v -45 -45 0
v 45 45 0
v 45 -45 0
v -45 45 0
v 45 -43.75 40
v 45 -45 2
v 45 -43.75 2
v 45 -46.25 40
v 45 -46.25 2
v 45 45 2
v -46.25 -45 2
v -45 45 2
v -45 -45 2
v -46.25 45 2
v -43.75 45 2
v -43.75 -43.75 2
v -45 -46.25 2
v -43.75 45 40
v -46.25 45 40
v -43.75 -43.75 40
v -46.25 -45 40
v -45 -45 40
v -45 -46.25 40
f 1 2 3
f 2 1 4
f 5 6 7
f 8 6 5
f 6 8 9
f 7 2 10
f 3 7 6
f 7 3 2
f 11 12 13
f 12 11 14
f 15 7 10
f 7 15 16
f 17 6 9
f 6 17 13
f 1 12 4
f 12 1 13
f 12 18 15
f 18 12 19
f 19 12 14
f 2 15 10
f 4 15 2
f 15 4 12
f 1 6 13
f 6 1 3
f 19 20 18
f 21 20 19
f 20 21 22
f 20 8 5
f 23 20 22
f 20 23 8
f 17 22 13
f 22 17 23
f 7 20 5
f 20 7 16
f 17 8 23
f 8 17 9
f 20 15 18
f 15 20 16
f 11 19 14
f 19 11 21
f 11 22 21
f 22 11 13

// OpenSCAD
// Built by bench/smallmodels/features/compiler.py from a list of features.
$fn = 64;
difference() {
  union() {
    translate([0, 0, 0]) translate([-45, -45, 0]) cube([90, 90, 2]);
  }
  union() {
    translate([-20.25, -20.25, -2]) rotate([0, 0, 0]) translate([-35.75, -35.75, 0]) cube([71.5, 71.5, 2]);
    translate([-6.75, -20.25, -2]) rotate([0, 0, 0]) translate([-35.75, -35.75, 0]) cube([71.5, 71.5, 2]);
    translate([6.75, -20.25, -2]) rotate([0, 0, 0]) translate([-35.75, -35.75, 0]) cube([71.5, 71.5, 2]);
    translate([20.25, -20.25, -2]) rotate([0, 0, 0]) translate([-35.75, -35.75, 0]) cube([71.5, 71.5, 2]);
    translate([-20.25, -6.75, -2]) rotate([0, 0, 0]) translate([-35.75, -35.75, 0]) cube([71.5, 71.5, 2]);
    translate([-6.75, -6.75, -2]) rotate([0, 0, 0]) translate([-35.75, -35.75, 0]) cube([71.5, 71.5, 2]);
    translate([6.75, -6.75, -2]) rotate([0, 0, 0]) translate([-35.75, -35.75, 0]) cube([71.5, 71.5, 2]);
    translate([20.25, -6.75, -2]) rotate([0, 0, 0]) translate([-35.75, -35.75, 0]) cube([71.5, 71.5, 2]);
    translate([-20.25, 6.75, -2]) rotate([0, 0, 0]) translate([-35.75, -35.75, 0]) cube([71.5, 71.5, 2]);
    translate([-6.75, 6.75, -2]) rotate([0, 0, 0]) translate([-35.75, -35.75, 0]) cube([71.5, 71.5, 2]);
    translate([6.75, 6.75, -2]) rotate([0, 0, 0]) translate([-35.75, -35.75, 0]) cube([71.5, 71.5, 2]);
    translate([20.25, 6.75, -2]) rotate([0, 0, 0]) translate([-35.75, -35.75, 0]) cube([71.5, 71.5, 2]);
    translate([-20.25, 20.25, -2]) rotate([0, 0, 0]) translate([-35.75, -35.75, 0]) cube([71.5, 71.5, 2]);
    translate([-6.75, 20.25, -2]) rotate([0, 0, 0]) translate([-35.75, -35.75, 0]) cube([71.5, 71.5, 2]);
    translate([6.75, 20.25, -2]) rotate([0, 0, 0]) translate([-35.75, -35.75, 0]) cube([71.5, 71.5, 2]);
    translate([20.25, 20.25, -2]) rotate([0, 0, 0]) translate([-35.75, -35.75, 0]) cube([71.5, 71.5, 2]);
  }
}
union() {
    translate([0, -45, 2]) translate([-45, -1.25, 0]) cube([90, 2.5, 38]);
    translate([-45, 0, 2]) translate([-1.25, -45, 0]) cube([2.5, 90, 38]);
  }
